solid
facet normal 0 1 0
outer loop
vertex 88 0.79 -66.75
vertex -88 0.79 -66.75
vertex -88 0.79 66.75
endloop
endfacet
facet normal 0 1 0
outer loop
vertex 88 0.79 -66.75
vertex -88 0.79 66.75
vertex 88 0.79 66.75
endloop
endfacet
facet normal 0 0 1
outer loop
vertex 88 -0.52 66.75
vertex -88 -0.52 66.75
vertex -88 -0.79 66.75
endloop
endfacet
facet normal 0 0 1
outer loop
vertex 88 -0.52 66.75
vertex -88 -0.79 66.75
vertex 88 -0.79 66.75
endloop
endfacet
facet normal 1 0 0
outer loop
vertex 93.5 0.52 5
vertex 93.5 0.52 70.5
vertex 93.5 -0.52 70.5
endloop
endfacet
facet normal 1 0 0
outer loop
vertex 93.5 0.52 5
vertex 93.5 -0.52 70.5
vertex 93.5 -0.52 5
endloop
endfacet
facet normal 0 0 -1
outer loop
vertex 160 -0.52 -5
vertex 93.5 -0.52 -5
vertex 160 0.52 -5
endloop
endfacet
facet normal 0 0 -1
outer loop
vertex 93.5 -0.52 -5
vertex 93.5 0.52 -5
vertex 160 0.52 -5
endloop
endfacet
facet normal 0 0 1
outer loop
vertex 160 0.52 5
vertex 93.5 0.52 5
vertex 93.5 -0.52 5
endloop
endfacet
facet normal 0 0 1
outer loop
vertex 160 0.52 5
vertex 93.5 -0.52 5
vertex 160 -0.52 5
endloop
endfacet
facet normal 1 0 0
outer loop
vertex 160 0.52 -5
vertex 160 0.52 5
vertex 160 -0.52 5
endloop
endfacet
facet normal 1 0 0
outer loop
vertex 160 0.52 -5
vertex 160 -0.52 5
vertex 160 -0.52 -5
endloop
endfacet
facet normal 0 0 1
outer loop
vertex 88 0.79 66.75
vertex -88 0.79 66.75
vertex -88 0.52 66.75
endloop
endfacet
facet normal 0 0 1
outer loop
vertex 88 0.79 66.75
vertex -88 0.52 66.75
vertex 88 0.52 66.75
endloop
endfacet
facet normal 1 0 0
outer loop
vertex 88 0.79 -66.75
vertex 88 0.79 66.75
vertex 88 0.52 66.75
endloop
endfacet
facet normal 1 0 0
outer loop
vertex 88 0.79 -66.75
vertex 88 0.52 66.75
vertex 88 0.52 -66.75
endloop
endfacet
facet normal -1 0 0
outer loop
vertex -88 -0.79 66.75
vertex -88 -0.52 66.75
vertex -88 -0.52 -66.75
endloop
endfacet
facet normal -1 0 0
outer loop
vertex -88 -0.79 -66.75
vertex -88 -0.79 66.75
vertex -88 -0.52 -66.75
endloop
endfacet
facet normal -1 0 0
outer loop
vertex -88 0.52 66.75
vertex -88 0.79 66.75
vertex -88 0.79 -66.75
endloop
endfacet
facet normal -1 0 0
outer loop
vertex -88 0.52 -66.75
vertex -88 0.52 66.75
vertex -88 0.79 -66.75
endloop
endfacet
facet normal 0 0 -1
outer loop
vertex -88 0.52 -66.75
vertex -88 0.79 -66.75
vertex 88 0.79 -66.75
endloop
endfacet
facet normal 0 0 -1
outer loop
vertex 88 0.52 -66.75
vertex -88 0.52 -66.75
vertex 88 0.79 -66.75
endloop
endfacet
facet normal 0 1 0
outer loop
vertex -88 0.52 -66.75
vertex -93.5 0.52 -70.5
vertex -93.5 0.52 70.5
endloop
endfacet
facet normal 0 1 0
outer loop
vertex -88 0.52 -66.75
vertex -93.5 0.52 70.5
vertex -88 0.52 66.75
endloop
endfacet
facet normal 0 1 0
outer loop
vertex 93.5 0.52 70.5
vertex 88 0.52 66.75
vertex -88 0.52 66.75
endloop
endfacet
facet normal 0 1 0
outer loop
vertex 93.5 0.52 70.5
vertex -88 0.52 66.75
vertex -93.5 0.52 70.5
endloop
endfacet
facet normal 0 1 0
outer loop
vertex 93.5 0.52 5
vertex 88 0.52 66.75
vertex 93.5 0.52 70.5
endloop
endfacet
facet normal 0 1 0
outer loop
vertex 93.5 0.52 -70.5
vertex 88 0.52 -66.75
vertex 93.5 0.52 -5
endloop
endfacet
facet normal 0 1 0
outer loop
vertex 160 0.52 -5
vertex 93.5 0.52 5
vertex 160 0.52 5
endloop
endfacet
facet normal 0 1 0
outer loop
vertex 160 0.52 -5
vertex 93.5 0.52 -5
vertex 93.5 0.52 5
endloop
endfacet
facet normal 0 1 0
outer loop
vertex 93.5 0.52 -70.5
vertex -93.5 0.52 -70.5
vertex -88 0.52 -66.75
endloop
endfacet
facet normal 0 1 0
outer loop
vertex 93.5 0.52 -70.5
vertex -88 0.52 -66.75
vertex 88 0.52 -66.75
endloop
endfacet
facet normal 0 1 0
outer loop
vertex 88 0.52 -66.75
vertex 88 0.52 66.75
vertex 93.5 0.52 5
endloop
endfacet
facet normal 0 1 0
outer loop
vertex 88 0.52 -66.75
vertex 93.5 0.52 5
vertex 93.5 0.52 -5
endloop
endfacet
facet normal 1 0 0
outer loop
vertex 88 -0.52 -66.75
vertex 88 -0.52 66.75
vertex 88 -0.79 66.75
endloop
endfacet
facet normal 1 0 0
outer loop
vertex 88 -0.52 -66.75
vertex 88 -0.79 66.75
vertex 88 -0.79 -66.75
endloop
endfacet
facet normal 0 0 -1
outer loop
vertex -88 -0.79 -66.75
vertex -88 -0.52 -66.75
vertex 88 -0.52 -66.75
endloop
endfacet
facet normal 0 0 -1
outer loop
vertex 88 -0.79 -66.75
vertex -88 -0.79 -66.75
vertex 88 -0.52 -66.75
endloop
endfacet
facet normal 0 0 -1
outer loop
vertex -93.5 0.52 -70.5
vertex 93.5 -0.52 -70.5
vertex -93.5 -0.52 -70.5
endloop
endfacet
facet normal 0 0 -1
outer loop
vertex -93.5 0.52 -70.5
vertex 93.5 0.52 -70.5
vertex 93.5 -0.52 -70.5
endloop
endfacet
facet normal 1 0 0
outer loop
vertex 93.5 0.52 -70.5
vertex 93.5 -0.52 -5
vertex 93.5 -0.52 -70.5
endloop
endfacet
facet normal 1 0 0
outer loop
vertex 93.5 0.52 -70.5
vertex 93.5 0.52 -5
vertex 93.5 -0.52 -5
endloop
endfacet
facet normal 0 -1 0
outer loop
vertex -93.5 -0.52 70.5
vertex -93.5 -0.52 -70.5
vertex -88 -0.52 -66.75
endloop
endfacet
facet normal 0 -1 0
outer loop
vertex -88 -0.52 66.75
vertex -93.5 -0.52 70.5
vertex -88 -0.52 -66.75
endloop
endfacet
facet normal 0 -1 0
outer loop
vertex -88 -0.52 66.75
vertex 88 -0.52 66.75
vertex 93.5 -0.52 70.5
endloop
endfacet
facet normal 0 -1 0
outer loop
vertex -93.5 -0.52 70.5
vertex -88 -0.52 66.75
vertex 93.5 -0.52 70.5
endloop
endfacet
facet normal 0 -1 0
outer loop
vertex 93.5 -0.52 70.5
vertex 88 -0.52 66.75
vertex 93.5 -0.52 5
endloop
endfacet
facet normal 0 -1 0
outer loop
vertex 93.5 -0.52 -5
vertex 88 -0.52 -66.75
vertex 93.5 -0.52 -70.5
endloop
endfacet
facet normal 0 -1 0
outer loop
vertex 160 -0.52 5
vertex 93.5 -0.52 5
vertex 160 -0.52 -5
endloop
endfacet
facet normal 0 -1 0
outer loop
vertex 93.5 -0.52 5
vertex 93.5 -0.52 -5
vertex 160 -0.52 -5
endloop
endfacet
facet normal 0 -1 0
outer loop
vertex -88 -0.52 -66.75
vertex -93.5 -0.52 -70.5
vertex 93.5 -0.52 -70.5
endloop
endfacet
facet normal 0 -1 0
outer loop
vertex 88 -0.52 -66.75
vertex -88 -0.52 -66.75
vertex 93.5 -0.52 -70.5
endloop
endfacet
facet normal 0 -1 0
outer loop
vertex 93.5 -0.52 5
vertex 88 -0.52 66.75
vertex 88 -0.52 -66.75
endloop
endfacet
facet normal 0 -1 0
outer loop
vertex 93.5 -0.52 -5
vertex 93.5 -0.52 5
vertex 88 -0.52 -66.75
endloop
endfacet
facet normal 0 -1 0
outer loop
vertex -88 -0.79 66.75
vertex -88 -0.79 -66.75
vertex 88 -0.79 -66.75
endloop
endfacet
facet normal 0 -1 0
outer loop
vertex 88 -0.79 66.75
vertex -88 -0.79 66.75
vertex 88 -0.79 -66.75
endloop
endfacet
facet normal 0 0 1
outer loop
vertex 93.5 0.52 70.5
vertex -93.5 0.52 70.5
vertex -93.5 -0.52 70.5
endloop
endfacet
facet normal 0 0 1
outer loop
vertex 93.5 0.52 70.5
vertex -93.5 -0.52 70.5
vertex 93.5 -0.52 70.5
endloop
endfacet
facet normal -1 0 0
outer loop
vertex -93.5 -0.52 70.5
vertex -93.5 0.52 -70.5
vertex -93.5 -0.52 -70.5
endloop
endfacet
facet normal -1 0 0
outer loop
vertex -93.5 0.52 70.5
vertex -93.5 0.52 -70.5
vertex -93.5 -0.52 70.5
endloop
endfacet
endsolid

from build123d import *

# Parameters (mm, degrees)
BOSS_EXTRUDE1_DEPTH = 0.52
SKETCH1_4_W         = 176
SKETCH1_4_H         = 133.5
BOSS_EXTRUDE2_DEPTH = 0.79


with BuildPart() as part:
    # Sketch1 → Boss-Extrude1 (new, symmetric)
    with BuildSketch(Plane(origin=(0, 0, 0), x_dir=(1, 0, 0), z_dir=(0, 1, 0))):
        Polygon((-93.5, 70.5), (-93.5, -70.5), (93.5, -70.5), (93.5, -5), (160, -5), (160, 5), (93.5, 5), (93.5, 70.5), align=None)
    extrude(amount=BOSS_EXTRUDE1_DEPTH, both=True)

    # Sketch1<4> → Boss-Extrude2 (add, symmetric)
    with BuildSketch(Plane(origin=(0, 0, 0), x_dir=(1, 0, 0), z_dir=(0, 1, 0))):
        Rectangle(SKETCH1_4_W, SKETCH1_4_H)
    extrude(amount=BOSS_EXTRUDE2_DEPTH, both=True)


solid = part.part
